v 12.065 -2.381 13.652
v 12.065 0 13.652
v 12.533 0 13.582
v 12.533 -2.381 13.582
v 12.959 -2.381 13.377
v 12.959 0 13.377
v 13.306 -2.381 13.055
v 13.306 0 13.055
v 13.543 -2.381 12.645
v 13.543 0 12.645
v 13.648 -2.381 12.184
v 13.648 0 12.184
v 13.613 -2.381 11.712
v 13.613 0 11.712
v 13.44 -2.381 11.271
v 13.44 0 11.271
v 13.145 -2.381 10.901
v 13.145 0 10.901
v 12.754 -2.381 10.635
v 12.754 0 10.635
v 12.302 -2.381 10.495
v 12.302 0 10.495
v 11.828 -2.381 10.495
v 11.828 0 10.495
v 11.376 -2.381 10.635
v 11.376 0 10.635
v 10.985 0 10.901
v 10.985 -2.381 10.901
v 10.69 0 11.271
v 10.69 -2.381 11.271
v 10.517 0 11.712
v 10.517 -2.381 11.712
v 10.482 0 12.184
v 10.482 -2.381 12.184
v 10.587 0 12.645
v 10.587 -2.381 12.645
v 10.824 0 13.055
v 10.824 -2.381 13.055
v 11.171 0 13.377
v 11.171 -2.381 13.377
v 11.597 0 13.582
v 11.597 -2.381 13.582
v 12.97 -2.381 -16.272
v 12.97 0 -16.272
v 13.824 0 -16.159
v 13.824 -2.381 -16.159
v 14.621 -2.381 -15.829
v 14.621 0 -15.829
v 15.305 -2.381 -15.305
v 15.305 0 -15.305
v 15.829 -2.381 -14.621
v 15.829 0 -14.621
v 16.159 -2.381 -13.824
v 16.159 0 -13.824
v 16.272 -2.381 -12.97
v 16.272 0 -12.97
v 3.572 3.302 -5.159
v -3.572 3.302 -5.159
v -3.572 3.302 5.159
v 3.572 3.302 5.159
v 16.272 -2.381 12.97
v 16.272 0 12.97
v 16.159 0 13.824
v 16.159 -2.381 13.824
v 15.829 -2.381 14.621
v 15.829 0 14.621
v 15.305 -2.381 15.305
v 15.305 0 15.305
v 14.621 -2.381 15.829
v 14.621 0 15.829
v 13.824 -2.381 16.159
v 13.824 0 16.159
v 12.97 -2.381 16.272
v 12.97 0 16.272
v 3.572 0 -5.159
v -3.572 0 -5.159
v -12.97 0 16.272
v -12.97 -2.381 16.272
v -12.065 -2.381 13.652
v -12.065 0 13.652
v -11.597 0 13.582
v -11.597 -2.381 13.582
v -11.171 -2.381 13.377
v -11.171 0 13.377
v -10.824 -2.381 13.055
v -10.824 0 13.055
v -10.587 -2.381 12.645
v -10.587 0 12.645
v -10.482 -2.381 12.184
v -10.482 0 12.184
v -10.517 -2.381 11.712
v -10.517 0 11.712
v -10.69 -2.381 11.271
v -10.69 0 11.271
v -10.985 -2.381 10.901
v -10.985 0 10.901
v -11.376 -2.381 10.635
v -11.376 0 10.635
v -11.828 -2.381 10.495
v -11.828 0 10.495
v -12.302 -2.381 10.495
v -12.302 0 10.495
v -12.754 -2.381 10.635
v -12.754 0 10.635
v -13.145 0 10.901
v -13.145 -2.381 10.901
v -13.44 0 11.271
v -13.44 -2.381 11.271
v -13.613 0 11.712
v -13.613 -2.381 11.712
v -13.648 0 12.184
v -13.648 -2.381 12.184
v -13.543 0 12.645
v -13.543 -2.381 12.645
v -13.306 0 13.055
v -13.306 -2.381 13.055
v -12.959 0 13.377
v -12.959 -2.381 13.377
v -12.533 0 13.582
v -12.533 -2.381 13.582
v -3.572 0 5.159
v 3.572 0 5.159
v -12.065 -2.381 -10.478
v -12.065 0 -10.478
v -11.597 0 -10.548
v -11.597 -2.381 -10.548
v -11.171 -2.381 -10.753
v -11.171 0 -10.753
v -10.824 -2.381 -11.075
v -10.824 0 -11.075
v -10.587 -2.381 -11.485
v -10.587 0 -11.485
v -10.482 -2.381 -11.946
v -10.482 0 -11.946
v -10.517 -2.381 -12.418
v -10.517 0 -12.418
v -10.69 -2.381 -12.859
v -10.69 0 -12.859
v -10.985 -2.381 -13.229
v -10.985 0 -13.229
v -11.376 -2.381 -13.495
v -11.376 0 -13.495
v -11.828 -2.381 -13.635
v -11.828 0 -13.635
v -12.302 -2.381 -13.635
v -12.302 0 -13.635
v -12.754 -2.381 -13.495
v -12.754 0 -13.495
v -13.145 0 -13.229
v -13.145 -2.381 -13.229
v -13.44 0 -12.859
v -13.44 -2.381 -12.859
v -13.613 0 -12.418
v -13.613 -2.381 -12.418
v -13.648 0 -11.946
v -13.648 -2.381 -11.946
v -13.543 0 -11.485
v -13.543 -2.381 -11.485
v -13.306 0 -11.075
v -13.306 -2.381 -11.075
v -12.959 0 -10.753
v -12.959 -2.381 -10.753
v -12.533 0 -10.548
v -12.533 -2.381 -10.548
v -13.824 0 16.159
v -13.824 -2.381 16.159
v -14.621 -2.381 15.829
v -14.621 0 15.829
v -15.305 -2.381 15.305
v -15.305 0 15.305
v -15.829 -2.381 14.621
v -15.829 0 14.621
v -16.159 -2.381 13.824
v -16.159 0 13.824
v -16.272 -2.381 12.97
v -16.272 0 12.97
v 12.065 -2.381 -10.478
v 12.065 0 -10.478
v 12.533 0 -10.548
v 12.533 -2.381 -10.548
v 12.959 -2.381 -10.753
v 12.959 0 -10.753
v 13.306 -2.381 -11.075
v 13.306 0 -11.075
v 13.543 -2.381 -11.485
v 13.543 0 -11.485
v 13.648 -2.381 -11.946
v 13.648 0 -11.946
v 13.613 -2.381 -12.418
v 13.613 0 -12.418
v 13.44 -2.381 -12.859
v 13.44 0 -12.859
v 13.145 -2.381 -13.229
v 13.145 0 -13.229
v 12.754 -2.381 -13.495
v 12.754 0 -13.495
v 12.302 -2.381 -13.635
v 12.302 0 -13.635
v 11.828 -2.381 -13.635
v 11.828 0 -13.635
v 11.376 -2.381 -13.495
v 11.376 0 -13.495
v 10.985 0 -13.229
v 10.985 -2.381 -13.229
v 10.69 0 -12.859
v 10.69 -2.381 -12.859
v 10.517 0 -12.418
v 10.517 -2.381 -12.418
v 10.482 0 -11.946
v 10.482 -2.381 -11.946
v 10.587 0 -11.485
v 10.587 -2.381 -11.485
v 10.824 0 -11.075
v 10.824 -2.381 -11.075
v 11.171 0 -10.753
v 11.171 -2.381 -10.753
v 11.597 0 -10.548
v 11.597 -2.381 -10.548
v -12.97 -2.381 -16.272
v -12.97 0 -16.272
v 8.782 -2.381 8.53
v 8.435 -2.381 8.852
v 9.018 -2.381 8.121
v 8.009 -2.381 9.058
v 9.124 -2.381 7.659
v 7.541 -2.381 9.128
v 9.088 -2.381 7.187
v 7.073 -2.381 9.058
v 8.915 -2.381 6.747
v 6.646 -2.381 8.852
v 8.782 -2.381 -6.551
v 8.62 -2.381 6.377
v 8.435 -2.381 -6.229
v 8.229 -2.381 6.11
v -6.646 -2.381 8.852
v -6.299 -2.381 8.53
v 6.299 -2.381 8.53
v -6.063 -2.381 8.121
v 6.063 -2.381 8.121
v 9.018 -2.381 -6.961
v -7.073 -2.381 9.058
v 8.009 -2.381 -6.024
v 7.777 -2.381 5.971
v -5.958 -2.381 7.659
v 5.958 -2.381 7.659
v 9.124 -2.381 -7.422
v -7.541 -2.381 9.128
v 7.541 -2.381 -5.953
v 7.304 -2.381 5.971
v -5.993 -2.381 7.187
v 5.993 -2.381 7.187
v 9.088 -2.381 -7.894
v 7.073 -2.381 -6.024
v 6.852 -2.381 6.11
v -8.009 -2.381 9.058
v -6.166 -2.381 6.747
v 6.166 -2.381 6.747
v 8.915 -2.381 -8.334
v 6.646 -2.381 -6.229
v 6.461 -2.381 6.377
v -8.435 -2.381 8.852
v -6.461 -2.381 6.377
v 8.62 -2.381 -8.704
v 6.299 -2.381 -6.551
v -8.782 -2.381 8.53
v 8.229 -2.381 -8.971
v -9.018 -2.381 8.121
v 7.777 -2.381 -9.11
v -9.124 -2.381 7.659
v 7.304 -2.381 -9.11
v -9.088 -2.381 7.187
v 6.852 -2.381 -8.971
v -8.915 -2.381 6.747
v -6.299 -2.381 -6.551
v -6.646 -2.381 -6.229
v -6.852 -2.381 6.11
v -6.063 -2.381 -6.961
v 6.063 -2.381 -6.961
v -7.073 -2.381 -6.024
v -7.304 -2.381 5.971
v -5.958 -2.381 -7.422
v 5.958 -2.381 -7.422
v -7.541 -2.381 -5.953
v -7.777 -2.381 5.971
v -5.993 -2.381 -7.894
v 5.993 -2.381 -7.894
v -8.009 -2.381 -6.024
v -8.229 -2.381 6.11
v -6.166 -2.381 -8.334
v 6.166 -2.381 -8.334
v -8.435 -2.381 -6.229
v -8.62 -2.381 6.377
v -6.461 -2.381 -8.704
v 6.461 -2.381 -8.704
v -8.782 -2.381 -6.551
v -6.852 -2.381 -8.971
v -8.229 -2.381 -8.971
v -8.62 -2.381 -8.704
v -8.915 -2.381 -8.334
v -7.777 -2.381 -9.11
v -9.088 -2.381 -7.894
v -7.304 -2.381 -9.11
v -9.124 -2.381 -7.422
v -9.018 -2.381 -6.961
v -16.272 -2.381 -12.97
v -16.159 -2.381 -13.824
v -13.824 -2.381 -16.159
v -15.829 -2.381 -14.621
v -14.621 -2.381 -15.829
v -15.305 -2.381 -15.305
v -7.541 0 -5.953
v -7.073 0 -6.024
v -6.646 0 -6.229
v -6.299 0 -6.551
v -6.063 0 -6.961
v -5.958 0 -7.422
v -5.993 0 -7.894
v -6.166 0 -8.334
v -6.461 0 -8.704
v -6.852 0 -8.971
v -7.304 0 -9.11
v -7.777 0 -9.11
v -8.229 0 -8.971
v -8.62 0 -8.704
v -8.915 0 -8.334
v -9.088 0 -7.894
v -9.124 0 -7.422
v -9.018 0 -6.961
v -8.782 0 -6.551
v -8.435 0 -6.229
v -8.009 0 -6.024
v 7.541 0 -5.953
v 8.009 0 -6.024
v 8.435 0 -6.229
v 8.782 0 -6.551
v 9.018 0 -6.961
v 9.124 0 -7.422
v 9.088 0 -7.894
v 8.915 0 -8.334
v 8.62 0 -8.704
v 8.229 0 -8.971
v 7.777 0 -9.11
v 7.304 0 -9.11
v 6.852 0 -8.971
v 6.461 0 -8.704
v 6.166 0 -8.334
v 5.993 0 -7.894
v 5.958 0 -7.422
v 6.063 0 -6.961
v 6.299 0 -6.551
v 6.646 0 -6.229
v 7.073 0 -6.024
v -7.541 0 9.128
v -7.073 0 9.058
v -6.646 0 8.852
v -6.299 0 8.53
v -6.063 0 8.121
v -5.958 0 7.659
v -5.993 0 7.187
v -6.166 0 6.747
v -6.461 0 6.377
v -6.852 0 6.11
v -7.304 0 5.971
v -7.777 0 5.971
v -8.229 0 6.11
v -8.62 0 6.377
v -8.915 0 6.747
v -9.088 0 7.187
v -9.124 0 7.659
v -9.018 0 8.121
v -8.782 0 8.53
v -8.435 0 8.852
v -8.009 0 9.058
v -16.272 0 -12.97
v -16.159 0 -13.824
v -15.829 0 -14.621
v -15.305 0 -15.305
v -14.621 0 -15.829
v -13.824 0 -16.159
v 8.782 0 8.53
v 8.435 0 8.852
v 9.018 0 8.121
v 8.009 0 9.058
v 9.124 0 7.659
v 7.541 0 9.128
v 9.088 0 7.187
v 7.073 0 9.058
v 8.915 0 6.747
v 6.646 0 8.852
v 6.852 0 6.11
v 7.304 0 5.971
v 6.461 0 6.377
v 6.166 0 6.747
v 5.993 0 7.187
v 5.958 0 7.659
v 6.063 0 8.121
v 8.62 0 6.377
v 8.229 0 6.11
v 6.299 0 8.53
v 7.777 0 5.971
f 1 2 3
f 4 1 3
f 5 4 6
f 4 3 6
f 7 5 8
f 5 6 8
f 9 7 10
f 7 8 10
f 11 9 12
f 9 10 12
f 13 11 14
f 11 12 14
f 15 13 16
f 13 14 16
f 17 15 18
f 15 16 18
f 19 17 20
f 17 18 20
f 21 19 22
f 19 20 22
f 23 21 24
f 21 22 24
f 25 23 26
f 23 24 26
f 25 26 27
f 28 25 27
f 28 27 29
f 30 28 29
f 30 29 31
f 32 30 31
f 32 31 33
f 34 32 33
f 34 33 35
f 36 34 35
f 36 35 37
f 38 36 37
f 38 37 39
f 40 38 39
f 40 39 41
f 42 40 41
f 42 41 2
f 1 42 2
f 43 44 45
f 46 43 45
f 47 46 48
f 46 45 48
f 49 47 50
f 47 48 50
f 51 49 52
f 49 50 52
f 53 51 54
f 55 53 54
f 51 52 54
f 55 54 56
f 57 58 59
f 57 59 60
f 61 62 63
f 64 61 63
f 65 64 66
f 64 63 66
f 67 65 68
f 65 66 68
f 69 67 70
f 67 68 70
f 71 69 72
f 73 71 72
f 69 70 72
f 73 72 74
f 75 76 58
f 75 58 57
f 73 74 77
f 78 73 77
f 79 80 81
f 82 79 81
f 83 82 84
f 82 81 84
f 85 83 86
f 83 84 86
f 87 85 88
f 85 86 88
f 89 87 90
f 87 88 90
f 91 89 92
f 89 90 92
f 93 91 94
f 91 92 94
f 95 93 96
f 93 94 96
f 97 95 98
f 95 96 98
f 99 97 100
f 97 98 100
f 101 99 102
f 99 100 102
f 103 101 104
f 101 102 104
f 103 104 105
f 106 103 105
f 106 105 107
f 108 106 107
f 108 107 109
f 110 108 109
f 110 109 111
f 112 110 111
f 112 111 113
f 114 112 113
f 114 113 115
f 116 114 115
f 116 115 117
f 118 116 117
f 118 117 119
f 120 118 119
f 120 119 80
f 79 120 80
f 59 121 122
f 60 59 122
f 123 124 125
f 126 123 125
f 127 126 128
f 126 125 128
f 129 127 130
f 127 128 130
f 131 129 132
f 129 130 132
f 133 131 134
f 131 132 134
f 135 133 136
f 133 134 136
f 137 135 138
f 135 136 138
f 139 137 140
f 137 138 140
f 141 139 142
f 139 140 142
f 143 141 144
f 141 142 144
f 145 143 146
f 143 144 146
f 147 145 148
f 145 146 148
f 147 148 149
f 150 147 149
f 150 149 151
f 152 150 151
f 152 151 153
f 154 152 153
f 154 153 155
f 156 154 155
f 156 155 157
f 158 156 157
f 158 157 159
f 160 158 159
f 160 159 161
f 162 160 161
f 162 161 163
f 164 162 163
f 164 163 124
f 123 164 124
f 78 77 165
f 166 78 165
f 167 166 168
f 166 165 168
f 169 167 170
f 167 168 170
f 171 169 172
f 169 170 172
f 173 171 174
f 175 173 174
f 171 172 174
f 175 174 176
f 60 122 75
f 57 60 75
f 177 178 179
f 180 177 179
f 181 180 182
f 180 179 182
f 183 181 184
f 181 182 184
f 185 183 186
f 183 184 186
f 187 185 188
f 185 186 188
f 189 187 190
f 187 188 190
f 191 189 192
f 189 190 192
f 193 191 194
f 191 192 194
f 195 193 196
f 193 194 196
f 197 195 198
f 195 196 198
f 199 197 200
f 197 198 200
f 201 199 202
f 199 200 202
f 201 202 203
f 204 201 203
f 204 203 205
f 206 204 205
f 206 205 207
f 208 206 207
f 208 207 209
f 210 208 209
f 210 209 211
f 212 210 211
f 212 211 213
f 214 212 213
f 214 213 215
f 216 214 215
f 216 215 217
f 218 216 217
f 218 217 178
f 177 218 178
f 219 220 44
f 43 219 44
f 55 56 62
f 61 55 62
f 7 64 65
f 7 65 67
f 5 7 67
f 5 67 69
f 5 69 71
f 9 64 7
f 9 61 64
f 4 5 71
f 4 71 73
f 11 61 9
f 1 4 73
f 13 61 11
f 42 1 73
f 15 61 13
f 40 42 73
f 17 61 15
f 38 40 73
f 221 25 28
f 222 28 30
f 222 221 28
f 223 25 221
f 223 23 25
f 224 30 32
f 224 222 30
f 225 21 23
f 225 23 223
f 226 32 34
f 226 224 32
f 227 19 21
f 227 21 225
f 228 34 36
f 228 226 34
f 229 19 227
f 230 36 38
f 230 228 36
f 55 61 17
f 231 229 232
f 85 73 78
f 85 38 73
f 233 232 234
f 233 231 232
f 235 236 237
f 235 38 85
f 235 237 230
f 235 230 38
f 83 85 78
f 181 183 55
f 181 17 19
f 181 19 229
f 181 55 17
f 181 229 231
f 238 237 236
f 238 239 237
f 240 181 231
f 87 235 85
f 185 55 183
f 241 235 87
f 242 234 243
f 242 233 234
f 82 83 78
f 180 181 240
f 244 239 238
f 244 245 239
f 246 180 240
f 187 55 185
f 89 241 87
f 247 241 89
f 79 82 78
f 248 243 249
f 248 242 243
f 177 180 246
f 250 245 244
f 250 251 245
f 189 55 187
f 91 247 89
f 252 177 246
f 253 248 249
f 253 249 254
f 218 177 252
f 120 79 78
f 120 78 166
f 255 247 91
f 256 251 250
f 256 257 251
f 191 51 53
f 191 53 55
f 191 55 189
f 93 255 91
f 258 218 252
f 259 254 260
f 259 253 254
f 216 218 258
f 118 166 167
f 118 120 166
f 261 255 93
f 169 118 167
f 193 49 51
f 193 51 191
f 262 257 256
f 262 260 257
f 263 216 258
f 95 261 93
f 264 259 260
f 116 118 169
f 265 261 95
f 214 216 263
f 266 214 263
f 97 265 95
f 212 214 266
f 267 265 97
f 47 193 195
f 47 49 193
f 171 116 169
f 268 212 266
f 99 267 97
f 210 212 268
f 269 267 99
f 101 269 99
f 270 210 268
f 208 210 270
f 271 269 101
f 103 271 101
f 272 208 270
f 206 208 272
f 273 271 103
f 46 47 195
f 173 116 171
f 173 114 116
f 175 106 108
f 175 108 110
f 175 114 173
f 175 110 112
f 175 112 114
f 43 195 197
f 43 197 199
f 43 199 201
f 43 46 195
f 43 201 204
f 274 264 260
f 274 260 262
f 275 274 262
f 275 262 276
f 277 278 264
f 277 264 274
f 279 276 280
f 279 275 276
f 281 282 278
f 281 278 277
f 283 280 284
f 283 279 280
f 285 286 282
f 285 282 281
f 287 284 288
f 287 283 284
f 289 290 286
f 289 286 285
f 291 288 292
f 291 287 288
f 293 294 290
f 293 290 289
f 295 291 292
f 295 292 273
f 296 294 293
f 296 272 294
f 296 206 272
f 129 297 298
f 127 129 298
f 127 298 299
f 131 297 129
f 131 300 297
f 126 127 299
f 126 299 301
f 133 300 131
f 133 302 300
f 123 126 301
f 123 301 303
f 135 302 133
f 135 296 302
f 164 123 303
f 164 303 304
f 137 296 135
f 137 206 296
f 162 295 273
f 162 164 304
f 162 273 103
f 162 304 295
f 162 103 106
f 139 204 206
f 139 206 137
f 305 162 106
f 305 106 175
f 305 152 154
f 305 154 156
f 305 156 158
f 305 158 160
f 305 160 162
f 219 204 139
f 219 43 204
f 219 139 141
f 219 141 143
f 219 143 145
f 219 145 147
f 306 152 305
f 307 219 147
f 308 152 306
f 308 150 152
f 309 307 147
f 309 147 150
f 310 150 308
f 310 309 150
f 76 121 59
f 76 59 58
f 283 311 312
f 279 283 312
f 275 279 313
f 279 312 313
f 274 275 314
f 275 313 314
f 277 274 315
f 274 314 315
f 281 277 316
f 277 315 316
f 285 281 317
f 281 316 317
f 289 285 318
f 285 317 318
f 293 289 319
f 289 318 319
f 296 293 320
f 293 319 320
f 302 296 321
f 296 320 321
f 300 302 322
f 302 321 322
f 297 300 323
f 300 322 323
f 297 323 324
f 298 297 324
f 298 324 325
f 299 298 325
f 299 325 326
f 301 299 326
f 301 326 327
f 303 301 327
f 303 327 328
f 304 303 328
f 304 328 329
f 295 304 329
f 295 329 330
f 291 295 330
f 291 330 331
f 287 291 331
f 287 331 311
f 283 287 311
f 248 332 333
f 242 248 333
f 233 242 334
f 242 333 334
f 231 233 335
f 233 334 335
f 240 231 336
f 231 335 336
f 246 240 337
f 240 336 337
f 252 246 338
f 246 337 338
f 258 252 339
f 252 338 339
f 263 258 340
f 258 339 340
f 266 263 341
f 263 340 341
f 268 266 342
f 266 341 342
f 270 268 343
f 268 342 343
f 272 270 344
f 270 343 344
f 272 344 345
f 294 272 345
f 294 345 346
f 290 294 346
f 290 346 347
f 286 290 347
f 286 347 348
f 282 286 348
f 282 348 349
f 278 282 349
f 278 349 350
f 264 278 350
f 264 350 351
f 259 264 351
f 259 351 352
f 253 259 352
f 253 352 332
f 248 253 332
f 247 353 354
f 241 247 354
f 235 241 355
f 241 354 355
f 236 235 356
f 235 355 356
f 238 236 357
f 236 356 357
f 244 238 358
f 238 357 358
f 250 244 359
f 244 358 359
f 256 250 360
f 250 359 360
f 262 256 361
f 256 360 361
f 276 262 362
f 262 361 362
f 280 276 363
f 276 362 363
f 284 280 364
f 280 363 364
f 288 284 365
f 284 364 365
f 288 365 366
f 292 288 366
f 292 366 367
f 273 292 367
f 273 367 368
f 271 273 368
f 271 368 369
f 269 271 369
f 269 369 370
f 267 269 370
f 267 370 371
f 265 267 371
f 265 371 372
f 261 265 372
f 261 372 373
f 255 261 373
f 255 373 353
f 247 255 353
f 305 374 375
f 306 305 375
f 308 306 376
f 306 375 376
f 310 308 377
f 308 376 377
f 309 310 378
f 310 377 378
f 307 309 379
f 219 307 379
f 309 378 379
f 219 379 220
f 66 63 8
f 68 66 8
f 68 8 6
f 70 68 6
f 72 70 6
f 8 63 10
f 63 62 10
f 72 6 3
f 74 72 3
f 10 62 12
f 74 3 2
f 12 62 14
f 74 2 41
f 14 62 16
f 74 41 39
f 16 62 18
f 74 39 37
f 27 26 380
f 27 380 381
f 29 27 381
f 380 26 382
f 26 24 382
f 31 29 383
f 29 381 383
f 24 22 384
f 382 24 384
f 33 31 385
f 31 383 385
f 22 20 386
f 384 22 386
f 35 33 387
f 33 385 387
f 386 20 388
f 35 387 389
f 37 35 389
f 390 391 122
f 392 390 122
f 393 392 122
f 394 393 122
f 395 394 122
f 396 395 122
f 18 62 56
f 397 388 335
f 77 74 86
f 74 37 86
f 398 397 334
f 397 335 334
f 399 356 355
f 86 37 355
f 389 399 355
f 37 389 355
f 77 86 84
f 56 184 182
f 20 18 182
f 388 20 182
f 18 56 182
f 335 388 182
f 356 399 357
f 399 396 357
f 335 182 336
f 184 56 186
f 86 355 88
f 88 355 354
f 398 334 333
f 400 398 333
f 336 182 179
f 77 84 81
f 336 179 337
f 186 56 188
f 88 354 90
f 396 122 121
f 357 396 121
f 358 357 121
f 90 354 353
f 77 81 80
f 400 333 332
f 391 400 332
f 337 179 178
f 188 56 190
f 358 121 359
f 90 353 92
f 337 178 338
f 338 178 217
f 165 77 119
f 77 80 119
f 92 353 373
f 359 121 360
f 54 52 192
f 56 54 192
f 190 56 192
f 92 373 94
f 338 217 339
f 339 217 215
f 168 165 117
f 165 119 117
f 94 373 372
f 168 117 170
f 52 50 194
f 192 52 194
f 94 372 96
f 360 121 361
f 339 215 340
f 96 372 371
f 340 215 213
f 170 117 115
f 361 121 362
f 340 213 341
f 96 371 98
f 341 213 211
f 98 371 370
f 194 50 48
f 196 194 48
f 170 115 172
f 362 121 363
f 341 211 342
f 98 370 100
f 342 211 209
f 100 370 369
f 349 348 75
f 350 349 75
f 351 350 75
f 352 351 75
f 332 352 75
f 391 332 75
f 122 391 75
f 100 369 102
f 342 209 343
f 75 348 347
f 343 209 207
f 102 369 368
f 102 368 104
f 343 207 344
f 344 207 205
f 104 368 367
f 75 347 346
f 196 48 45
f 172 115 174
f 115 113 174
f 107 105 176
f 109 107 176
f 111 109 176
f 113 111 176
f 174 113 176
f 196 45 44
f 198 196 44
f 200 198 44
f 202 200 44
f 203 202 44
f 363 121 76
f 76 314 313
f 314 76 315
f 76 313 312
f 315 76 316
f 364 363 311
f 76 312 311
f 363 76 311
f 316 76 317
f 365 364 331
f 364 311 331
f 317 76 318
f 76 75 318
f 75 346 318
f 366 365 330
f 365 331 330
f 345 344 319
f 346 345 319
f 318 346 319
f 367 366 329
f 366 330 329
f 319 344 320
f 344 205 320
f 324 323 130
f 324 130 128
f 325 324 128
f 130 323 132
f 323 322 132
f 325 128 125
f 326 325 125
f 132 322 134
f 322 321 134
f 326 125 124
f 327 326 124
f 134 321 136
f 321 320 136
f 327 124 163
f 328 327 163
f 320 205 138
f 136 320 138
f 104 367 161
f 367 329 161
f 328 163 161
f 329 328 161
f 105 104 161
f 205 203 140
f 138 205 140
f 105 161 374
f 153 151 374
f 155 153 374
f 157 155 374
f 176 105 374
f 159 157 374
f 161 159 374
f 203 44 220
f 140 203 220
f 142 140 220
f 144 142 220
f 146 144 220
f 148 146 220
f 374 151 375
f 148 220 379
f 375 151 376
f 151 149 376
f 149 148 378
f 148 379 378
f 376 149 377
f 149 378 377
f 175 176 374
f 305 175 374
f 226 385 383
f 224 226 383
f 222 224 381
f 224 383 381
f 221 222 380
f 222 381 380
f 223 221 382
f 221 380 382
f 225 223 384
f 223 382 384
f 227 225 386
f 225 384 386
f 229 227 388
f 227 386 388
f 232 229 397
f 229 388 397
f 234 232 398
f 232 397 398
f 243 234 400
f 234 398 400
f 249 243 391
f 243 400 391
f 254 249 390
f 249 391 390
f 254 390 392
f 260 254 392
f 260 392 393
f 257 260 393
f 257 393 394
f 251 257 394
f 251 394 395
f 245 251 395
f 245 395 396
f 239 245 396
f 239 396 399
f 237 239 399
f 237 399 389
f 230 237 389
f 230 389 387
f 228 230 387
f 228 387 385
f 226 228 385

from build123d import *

# Parameters (mm, degrees)
BOSS_EXTRUDE1_DEPTH = 2.38125
SKETCH1_4_W         = 7.14375
SKETCH1_4_H         = 10.31875
BOSS_EXTRUDE2_DEPTH = 3.302
SKETCH1_5_R         = 1.5875
CUT_EXTRUDE1_DEPTH  = 24.247602802


with BuildPart() as part:
    # Sketch1 → Boss-Extrude1 (new body)
    with BuildSketch(Plane(origin=(0, 0, 0), x_dir=(1, 0, 0), z_dir=(0, 1, 0))):
        with BuildLine():
            Line((12.969875, -16.271875), (-12.969875, -16.271875))
            ThreePointArc((-12.969875, -16.271875), (-15.304741591, -15.304741591), (-16.271875, -12.969875))
            Line((-16.271875, -12.969875), (-16.271875, 12.969875))
            ThreePointArc((-16.271875, 12.969875), (-15.304741591, 15.304741591), (-12.969875, 16.271875))
            Line((-12.969875, 16.271875), (12.969875, 16.271875))
            ThreePointArc((12.969875, 16.271875), (15.304741591, 15.304741591), (16.271875, 12.969875))
            Line((16.271875, 12.969875), (16.271875, -12.969875))
            ThreePointArc((16.271875, -12.969875), (15.304741591, -15.304741591), (12.969875, -16.271875))
        make_face()
    extrude(amount=-BOSS_EXTRUDE1_DEPTH)

    # Sketch1<4> → Boss-Extrude2 (add)
    with BuildSketch(Plane(origin=(0, 0, 0), x_dir=(1, 0, 0), z_dir=(0, 1, 0))):
        Rectangle(SKETCH1_4_W, SKETCH1_4_H)
    extrude(amount=BOSS_EXTRUDE2_DEPTH)

    # Sketch1<5> → Cut-Extrude1 (cut, through all)
    with BuildSketch(Plane(origin=(0, 0, 0), x_dir=(1, 0, 0), z_dir=(0, 1, 0))):
        with Locations((12.065, 12.065)):
            Circle(SKETCH1_5_R)
        with Locations((7.540625, 7.540625)):
            Circle(SKETCH1_5_R)
        with Locations((-7.540625, -7.540625)):
            Circle(SKETCH1_5_R)
        with Locations((-12.065, -12.065)):
            Circle(SKETCH1_5_R)
        with Locations((-12.065, 12.065)):
            Circle(SKETCH1_5_R)
        with Locations((-7.540625, 7.540625)):
            Circle(SKETCH1_5_R)
        with Locations((7.540625, -7.540625)):
            Circle(SKETCH1_5_R)
        with Locations((12.065, -12.065)):
            Circle(SKETCH1_5_R)
    extrude(amount=-CUT_EXTRUDE1_DEPTH, mode=Mode.SUBTRACT)


solid = part.part
